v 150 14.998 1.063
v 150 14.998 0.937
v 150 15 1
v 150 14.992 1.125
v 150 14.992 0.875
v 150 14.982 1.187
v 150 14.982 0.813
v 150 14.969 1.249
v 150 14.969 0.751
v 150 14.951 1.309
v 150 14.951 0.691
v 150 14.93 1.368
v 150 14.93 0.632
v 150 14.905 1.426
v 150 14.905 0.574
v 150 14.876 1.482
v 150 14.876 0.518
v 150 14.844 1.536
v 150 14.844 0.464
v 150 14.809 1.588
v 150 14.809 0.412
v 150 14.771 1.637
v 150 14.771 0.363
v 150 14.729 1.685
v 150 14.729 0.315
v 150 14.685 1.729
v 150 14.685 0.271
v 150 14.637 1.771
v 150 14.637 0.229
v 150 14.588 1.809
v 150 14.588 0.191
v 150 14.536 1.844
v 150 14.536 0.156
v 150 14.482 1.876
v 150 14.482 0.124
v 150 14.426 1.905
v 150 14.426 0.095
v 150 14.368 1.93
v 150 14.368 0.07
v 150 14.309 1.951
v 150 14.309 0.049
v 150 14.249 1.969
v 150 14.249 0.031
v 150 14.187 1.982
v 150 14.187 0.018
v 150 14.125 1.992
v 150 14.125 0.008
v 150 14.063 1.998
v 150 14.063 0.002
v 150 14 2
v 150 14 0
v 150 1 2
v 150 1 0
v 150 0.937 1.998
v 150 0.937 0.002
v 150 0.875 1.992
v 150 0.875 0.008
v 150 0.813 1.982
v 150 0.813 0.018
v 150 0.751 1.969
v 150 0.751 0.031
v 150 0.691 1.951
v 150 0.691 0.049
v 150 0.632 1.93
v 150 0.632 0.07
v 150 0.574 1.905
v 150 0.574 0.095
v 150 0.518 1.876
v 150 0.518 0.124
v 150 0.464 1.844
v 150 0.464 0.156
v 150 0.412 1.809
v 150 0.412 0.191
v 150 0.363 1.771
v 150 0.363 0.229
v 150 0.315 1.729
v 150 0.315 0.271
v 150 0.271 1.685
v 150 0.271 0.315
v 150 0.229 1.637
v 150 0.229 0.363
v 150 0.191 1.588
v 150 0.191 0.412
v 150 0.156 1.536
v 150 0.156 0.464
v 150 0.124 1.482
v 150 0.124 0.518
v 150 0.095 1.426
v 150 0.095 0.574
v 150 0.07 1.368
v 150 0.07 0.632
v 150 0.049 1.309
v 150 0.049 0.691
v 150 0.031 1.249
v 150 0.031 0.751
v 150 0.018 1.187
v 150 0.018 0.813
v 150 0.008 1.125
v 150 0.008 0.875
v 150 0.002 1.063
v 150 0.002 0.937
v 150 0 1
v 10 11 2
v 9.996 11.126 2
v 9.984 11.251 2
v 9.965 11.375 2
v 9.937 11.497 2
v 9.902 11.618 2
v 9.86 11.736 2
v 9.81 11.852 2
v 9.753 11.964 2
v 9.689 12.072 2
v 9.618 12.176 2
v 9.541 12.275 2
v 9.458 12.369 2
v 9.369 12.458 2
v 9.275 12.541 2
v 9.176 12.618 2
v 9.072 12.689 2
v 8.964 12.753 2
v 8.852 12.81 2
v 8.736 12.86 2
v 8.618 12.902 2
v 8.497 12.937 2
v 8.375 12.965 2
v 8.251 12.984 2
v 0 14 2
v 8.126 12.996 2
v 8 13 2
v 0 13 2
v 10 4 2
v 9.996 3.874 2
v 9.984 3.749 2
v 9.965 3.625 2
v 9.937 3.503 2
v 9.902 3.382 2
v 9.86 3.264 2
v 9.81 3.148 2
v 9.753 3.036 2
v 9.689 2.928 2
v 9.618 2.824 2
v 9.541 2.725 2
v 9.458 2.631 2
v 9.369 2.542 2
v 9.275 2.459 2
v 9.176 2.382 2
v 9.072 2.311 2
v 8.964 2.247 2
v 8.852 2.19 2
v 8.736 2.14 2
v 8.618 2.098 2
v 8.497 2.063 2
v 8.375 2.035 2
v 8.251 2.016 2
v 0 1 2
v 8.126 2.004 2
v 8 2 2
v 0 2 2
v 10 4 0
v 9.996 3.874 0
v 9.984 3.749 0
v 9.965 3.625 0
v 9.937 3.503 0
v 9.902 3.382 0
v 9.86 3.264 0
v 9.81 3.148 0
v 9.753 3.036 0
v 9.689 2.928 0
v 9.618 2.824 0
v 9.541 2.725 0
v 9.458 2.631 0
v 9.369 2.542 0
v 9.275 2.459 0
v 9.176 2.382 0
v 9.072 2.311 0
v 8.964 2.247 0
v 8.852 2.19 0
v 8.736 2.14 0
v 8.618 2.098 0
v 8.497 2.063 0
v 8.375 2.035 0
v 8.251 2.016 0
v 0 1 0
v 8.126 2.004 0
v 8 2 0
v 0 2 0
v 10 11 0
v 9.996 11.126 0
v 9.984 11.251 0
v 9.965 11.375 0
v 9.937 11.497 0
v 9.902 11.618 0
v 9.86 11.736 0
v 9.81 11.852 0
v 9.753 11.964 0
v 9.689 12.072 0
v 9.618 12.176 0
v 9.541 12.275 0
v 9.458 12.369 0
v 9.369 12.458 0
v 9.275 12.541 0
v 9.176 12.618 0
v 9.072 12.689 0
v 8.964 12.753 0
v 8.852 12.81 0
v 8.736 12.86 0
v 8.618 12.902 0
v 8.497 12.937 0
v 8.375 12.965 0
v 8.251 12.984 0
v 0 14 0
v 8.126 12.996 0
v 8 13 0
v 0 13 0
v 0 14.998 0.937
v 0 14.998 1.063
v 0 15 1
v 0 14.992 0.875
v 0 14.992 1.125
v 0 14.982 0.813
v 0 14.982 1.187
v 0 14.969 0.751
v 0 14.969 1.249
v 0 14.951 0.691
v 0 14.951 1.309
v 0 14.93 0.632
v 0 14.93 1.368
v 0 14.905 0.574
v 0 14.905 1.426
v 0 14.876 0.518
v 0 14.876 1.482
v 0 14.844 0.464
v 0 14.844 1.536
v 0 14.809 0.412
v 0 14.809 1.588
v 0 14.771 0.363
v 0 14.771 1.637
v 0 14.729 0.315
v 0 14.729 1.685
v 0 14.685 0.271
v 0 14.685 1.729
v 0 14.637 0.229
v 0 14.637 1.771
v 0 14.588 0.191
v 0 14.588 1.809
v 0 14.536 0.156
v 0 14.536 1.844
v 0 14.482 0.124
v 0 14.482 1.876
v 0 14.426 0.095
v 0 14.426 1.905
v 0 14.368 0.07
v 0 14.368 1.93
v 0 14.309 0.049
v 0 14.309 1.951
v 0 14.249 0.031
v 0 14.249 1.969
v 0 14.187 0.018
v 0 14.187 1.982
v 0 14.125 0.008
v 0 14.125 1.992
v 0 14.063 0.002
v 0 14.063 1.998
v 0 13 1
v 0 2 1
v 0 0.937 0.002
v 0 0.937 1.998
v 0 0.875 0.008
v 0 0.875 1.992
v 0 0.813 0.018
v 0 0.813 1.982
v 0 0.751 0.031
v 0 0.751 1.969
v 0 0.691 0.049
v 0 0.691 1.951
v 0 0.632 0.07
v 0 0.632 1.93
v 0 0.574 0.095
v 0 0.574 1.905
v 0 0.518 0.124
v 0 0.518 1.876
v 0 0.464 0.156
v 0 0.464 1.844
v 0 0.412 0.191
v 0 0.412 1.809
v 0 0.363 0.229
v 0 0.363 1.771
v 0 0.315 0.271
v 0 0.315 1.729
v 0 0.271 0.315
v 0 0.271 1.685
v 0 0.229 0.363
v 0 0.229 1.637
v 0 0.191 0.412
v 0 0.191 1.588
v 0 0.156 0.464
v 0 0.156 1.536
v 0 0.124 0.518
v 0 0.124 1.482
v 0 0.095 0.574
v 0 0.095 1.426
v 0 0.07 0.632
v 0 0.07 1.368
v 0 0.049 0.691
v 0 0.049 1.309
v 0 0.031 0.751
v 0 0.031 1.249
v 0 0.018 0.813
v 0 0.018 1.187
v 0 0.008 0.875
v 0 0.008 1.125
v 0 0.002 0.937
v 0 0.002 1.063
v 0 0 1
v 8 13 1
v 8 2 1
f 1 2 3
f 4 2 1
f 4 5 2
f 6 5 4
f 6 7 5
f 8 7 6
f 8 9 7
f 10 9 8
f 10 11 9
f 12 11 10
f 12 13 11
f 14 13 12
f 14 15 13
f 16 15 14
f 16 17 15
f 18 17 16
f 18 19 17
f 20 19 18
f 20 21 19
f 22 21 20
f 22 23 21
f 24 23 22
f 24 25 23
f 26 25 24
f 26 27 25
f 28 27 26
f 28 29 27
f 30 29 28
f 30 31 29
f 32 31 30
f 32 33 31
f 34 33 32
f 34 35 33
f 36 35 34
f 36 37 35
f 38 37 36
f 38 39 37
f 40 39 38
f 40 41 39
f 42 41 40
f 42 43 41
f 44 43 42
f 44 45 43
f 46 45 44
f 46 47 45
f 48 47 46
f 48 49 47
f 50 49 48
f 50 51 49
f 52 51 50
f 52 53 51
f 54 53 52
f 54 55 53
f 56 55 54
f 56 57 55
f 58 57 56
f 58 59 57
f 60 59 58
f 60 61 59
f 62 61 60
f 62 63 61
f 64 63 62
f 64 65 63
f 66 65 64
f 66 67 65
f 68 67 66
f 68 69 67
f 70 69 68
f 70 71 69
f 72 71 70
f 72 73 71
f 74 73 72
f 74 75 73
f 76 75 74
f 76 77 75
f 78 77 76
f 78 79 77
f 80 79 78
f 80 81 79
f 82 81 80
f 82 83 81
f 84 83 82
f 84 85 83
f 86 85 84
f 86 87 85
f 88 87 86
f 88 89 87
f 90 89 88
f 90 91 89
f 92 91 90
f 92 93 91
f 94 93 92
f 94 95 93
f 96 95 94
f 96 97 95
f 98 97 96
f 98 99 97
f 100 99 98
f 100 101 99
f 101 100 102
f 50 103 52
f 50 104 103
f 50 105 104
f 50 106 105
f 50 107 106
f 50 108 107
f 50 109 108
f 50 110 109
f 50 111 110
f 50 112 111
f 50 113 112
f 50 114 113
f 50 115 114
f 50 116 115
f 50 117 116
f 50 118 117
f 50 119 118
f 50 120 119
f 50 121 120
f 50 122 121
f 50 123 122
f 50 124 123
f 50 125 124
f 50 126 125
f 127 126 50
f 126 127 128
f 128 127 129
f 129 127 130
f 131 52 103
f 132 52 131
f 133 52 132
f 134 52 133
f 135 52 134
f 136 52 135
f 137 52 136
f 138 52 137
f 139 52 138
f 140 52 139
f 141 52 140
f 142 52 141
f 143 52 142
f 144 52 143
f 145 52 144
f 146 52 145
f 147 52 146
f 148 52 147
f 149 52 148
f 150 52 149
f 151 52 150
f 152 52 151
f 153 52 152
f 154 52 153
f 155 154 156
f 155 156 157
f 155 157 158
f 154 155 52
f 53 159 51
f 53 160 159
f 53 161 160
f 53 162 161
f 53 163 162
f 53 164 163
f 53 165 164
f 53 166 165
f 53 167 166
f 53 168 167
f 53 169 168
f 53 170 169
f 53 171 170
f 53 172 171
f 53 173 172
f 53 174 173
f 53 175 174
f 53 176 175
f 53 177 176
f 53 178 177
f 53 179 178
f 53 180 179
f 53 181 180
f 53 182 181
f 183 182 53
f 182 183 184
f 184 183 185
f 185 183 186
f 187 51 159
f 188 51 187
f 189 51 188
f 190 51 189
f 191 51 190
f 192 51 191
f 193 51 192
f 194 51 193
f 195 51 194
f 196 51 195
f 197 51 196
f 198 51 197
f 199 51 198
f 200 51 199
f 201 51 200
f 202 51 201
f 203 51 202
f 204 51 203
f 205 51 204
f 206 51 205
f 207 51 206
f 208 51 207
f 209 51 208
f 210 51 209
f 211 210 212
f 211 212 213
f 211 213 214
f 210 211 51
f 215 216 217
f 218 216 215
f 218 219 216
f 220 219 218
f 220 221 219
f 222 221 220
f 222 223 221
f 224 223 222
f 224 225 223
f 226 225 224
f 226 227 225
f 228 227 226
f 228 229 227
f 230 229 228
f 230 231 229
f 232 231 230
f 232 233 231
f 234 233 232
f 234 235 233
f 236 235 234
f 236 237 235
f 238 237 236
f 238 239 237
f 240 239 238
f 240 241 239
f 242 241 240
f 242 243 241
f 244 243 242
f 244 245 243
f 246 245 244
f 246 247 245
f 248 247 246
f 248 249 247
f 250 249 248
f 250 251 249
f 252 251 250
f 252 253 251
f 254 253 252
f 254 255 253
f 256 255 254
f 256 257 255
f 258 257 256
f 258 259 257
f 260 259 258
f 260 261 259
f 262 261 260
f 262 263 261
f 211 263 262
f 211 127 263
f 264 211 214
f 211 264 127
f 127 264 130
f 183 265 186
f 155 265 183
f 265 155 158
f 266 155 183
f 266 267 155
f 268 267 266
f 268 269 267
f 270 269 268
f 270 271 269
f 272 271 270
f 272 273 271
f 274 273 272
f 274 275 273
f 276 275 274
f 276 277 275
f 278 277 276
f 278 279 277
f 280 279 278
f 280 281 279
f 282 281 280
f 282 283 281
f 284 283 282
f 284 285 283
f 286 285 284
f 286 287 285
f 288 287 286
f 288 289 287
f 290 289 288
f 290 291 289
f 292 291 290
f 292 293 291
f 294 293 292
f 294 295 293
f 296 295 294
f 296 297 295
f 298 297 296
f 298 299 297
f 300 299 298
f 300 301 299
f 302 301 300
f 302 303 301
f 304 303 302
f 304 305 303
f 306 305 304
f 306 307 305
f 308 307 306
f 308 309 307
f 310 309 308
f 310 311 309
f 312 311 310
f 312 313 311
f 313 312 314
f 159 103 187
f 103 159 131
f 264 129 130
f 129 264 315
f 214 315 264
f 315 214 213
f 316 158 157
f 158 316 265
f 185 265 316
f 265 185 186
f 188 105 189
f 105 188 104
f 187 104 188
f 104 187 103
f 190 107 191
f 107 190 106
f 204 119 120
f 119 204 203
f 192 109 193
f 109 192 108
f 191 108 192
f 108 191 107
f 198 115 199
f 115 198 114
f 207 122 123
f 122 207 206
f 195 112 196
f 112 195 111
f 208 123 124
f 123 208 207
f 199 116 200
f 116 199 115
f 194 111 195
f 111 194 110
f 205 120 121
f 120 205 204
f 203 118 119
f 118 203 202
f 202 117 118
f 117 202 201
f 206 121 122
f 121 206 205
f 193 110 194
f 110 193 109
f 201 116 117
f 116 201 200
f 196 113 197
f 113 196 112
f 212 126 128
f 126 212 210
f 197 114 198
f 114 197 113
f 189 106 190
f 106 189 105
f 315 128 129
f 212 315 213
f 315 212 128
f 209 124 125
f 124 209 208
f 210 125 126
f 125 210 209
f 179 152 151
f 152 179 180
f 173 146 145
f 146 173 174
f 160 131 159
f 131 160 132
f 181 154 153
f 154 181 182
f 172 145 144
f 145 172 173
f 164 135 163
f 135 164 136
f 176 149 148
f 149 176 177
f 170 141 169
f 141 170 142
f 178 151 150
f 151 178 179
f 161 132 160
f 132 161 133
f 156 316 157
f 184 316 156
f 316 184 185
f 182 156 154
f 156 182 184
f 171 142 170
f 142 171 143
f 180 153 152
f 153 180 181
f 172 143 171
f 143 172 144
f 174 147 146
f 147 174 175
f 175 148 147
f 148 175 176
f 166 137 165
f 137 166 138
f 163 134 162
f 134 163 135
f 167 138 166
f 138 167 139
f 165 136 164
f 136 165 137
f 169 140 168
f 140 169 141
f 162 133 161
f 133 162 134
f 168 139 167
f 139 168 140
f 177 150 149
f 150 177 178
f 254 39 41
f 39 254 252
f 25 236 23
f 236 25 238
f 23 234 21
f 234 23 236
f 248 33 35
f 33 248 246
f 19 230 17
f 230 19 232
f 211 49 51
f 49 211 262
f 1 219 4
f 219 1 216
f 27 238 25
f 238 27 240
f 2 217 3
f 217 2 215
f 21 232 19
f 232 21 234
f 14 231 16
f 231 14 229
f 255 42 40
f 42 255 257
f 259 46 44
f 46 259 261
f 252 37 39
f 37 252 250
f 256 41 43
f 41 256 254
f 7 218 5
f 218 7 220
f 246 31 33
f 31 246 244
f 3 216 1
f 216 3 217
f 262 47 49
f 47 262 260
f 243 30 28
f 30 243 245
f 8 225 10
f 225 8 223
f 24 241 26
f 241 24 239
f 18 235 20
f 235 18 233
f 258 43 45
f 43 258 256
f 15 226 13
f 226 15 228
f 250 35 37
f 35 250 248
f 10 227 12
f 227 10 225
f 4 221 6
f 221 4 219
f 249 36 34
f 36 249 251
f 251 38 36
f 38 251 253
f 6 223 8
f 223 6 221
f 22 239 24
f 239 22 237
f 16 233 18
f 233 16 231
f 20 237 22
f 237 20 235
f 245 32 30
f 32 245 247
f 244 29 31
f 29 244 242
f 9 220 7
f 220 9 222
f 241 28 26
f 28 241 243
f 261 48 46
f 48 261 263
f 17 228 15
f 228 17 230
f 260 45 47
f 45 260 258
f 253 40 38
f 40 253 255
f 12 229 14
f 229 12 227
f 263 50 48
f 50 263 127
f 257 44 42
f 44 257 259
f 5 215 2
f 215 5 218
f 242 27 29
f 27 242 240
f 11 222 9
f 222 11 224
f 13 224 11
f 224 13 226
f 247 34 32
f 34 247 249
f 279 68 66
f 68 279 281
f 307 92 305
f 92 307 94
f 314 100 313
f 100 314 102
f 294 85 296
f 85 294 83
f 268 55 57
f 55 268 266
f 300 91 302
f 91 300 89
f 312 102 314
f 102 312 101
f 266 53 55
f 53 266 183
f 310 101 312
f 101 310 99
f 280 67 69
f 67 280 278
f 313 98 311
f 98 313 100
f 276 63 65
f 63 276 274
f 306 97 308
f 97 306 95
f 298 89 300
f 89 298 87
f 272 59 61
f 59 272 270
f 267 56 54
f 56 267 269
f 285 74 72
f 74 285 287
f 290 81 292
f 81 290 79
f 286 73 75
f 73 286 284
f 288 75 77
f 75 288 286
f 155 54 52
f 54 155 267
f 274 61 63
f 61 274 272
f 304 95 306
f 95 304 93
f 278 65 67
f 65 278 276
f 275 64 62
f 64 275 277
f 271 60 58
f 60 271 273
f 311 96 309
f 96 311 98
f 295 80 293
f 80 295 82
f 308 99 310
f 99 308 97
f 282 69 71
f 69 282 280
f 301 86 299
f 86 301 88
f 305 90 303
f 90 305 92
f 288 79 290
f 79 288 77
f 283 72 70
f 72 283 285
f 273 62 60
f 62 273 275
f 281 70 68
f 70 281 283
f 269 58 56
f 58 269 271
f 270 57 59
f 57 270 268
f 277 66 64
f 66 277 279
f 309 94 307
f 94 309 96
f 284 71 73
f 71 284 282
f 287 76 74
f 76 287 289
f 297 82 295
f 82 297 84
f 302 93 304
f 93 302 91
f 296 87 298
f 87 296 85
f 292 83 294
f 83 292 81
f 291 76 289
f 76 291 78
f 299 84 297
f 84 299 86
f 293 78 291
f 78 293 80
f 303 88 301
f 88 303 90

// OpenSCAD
union() {
difference () {

translate([0,1,0])
cube([150, 13, 2]); //$fn = 100);


translate([0,2,0])
cube([10, 11, 2]); //$fn = 100);

}

}


difference () {
translate([8,11,0])
cube([2,2,2]);
translate([8,11,0])
cylinder(h = 2, r = 2, $fn = 100);}

difference () {
translate([8,2,0])
cube([2,2,2]);
translate([8,4,0])
cylinder(h = 2, r = 2, $fn = 100);}

translate([0,14,1])
rotate ([0,90,0])
cylinder(h = 150, r = 1, $fn = 100);

translate([0,1,1])
rotate ([0,90,0])
cylinder(h = 150, r = 1, $fn = 100);
